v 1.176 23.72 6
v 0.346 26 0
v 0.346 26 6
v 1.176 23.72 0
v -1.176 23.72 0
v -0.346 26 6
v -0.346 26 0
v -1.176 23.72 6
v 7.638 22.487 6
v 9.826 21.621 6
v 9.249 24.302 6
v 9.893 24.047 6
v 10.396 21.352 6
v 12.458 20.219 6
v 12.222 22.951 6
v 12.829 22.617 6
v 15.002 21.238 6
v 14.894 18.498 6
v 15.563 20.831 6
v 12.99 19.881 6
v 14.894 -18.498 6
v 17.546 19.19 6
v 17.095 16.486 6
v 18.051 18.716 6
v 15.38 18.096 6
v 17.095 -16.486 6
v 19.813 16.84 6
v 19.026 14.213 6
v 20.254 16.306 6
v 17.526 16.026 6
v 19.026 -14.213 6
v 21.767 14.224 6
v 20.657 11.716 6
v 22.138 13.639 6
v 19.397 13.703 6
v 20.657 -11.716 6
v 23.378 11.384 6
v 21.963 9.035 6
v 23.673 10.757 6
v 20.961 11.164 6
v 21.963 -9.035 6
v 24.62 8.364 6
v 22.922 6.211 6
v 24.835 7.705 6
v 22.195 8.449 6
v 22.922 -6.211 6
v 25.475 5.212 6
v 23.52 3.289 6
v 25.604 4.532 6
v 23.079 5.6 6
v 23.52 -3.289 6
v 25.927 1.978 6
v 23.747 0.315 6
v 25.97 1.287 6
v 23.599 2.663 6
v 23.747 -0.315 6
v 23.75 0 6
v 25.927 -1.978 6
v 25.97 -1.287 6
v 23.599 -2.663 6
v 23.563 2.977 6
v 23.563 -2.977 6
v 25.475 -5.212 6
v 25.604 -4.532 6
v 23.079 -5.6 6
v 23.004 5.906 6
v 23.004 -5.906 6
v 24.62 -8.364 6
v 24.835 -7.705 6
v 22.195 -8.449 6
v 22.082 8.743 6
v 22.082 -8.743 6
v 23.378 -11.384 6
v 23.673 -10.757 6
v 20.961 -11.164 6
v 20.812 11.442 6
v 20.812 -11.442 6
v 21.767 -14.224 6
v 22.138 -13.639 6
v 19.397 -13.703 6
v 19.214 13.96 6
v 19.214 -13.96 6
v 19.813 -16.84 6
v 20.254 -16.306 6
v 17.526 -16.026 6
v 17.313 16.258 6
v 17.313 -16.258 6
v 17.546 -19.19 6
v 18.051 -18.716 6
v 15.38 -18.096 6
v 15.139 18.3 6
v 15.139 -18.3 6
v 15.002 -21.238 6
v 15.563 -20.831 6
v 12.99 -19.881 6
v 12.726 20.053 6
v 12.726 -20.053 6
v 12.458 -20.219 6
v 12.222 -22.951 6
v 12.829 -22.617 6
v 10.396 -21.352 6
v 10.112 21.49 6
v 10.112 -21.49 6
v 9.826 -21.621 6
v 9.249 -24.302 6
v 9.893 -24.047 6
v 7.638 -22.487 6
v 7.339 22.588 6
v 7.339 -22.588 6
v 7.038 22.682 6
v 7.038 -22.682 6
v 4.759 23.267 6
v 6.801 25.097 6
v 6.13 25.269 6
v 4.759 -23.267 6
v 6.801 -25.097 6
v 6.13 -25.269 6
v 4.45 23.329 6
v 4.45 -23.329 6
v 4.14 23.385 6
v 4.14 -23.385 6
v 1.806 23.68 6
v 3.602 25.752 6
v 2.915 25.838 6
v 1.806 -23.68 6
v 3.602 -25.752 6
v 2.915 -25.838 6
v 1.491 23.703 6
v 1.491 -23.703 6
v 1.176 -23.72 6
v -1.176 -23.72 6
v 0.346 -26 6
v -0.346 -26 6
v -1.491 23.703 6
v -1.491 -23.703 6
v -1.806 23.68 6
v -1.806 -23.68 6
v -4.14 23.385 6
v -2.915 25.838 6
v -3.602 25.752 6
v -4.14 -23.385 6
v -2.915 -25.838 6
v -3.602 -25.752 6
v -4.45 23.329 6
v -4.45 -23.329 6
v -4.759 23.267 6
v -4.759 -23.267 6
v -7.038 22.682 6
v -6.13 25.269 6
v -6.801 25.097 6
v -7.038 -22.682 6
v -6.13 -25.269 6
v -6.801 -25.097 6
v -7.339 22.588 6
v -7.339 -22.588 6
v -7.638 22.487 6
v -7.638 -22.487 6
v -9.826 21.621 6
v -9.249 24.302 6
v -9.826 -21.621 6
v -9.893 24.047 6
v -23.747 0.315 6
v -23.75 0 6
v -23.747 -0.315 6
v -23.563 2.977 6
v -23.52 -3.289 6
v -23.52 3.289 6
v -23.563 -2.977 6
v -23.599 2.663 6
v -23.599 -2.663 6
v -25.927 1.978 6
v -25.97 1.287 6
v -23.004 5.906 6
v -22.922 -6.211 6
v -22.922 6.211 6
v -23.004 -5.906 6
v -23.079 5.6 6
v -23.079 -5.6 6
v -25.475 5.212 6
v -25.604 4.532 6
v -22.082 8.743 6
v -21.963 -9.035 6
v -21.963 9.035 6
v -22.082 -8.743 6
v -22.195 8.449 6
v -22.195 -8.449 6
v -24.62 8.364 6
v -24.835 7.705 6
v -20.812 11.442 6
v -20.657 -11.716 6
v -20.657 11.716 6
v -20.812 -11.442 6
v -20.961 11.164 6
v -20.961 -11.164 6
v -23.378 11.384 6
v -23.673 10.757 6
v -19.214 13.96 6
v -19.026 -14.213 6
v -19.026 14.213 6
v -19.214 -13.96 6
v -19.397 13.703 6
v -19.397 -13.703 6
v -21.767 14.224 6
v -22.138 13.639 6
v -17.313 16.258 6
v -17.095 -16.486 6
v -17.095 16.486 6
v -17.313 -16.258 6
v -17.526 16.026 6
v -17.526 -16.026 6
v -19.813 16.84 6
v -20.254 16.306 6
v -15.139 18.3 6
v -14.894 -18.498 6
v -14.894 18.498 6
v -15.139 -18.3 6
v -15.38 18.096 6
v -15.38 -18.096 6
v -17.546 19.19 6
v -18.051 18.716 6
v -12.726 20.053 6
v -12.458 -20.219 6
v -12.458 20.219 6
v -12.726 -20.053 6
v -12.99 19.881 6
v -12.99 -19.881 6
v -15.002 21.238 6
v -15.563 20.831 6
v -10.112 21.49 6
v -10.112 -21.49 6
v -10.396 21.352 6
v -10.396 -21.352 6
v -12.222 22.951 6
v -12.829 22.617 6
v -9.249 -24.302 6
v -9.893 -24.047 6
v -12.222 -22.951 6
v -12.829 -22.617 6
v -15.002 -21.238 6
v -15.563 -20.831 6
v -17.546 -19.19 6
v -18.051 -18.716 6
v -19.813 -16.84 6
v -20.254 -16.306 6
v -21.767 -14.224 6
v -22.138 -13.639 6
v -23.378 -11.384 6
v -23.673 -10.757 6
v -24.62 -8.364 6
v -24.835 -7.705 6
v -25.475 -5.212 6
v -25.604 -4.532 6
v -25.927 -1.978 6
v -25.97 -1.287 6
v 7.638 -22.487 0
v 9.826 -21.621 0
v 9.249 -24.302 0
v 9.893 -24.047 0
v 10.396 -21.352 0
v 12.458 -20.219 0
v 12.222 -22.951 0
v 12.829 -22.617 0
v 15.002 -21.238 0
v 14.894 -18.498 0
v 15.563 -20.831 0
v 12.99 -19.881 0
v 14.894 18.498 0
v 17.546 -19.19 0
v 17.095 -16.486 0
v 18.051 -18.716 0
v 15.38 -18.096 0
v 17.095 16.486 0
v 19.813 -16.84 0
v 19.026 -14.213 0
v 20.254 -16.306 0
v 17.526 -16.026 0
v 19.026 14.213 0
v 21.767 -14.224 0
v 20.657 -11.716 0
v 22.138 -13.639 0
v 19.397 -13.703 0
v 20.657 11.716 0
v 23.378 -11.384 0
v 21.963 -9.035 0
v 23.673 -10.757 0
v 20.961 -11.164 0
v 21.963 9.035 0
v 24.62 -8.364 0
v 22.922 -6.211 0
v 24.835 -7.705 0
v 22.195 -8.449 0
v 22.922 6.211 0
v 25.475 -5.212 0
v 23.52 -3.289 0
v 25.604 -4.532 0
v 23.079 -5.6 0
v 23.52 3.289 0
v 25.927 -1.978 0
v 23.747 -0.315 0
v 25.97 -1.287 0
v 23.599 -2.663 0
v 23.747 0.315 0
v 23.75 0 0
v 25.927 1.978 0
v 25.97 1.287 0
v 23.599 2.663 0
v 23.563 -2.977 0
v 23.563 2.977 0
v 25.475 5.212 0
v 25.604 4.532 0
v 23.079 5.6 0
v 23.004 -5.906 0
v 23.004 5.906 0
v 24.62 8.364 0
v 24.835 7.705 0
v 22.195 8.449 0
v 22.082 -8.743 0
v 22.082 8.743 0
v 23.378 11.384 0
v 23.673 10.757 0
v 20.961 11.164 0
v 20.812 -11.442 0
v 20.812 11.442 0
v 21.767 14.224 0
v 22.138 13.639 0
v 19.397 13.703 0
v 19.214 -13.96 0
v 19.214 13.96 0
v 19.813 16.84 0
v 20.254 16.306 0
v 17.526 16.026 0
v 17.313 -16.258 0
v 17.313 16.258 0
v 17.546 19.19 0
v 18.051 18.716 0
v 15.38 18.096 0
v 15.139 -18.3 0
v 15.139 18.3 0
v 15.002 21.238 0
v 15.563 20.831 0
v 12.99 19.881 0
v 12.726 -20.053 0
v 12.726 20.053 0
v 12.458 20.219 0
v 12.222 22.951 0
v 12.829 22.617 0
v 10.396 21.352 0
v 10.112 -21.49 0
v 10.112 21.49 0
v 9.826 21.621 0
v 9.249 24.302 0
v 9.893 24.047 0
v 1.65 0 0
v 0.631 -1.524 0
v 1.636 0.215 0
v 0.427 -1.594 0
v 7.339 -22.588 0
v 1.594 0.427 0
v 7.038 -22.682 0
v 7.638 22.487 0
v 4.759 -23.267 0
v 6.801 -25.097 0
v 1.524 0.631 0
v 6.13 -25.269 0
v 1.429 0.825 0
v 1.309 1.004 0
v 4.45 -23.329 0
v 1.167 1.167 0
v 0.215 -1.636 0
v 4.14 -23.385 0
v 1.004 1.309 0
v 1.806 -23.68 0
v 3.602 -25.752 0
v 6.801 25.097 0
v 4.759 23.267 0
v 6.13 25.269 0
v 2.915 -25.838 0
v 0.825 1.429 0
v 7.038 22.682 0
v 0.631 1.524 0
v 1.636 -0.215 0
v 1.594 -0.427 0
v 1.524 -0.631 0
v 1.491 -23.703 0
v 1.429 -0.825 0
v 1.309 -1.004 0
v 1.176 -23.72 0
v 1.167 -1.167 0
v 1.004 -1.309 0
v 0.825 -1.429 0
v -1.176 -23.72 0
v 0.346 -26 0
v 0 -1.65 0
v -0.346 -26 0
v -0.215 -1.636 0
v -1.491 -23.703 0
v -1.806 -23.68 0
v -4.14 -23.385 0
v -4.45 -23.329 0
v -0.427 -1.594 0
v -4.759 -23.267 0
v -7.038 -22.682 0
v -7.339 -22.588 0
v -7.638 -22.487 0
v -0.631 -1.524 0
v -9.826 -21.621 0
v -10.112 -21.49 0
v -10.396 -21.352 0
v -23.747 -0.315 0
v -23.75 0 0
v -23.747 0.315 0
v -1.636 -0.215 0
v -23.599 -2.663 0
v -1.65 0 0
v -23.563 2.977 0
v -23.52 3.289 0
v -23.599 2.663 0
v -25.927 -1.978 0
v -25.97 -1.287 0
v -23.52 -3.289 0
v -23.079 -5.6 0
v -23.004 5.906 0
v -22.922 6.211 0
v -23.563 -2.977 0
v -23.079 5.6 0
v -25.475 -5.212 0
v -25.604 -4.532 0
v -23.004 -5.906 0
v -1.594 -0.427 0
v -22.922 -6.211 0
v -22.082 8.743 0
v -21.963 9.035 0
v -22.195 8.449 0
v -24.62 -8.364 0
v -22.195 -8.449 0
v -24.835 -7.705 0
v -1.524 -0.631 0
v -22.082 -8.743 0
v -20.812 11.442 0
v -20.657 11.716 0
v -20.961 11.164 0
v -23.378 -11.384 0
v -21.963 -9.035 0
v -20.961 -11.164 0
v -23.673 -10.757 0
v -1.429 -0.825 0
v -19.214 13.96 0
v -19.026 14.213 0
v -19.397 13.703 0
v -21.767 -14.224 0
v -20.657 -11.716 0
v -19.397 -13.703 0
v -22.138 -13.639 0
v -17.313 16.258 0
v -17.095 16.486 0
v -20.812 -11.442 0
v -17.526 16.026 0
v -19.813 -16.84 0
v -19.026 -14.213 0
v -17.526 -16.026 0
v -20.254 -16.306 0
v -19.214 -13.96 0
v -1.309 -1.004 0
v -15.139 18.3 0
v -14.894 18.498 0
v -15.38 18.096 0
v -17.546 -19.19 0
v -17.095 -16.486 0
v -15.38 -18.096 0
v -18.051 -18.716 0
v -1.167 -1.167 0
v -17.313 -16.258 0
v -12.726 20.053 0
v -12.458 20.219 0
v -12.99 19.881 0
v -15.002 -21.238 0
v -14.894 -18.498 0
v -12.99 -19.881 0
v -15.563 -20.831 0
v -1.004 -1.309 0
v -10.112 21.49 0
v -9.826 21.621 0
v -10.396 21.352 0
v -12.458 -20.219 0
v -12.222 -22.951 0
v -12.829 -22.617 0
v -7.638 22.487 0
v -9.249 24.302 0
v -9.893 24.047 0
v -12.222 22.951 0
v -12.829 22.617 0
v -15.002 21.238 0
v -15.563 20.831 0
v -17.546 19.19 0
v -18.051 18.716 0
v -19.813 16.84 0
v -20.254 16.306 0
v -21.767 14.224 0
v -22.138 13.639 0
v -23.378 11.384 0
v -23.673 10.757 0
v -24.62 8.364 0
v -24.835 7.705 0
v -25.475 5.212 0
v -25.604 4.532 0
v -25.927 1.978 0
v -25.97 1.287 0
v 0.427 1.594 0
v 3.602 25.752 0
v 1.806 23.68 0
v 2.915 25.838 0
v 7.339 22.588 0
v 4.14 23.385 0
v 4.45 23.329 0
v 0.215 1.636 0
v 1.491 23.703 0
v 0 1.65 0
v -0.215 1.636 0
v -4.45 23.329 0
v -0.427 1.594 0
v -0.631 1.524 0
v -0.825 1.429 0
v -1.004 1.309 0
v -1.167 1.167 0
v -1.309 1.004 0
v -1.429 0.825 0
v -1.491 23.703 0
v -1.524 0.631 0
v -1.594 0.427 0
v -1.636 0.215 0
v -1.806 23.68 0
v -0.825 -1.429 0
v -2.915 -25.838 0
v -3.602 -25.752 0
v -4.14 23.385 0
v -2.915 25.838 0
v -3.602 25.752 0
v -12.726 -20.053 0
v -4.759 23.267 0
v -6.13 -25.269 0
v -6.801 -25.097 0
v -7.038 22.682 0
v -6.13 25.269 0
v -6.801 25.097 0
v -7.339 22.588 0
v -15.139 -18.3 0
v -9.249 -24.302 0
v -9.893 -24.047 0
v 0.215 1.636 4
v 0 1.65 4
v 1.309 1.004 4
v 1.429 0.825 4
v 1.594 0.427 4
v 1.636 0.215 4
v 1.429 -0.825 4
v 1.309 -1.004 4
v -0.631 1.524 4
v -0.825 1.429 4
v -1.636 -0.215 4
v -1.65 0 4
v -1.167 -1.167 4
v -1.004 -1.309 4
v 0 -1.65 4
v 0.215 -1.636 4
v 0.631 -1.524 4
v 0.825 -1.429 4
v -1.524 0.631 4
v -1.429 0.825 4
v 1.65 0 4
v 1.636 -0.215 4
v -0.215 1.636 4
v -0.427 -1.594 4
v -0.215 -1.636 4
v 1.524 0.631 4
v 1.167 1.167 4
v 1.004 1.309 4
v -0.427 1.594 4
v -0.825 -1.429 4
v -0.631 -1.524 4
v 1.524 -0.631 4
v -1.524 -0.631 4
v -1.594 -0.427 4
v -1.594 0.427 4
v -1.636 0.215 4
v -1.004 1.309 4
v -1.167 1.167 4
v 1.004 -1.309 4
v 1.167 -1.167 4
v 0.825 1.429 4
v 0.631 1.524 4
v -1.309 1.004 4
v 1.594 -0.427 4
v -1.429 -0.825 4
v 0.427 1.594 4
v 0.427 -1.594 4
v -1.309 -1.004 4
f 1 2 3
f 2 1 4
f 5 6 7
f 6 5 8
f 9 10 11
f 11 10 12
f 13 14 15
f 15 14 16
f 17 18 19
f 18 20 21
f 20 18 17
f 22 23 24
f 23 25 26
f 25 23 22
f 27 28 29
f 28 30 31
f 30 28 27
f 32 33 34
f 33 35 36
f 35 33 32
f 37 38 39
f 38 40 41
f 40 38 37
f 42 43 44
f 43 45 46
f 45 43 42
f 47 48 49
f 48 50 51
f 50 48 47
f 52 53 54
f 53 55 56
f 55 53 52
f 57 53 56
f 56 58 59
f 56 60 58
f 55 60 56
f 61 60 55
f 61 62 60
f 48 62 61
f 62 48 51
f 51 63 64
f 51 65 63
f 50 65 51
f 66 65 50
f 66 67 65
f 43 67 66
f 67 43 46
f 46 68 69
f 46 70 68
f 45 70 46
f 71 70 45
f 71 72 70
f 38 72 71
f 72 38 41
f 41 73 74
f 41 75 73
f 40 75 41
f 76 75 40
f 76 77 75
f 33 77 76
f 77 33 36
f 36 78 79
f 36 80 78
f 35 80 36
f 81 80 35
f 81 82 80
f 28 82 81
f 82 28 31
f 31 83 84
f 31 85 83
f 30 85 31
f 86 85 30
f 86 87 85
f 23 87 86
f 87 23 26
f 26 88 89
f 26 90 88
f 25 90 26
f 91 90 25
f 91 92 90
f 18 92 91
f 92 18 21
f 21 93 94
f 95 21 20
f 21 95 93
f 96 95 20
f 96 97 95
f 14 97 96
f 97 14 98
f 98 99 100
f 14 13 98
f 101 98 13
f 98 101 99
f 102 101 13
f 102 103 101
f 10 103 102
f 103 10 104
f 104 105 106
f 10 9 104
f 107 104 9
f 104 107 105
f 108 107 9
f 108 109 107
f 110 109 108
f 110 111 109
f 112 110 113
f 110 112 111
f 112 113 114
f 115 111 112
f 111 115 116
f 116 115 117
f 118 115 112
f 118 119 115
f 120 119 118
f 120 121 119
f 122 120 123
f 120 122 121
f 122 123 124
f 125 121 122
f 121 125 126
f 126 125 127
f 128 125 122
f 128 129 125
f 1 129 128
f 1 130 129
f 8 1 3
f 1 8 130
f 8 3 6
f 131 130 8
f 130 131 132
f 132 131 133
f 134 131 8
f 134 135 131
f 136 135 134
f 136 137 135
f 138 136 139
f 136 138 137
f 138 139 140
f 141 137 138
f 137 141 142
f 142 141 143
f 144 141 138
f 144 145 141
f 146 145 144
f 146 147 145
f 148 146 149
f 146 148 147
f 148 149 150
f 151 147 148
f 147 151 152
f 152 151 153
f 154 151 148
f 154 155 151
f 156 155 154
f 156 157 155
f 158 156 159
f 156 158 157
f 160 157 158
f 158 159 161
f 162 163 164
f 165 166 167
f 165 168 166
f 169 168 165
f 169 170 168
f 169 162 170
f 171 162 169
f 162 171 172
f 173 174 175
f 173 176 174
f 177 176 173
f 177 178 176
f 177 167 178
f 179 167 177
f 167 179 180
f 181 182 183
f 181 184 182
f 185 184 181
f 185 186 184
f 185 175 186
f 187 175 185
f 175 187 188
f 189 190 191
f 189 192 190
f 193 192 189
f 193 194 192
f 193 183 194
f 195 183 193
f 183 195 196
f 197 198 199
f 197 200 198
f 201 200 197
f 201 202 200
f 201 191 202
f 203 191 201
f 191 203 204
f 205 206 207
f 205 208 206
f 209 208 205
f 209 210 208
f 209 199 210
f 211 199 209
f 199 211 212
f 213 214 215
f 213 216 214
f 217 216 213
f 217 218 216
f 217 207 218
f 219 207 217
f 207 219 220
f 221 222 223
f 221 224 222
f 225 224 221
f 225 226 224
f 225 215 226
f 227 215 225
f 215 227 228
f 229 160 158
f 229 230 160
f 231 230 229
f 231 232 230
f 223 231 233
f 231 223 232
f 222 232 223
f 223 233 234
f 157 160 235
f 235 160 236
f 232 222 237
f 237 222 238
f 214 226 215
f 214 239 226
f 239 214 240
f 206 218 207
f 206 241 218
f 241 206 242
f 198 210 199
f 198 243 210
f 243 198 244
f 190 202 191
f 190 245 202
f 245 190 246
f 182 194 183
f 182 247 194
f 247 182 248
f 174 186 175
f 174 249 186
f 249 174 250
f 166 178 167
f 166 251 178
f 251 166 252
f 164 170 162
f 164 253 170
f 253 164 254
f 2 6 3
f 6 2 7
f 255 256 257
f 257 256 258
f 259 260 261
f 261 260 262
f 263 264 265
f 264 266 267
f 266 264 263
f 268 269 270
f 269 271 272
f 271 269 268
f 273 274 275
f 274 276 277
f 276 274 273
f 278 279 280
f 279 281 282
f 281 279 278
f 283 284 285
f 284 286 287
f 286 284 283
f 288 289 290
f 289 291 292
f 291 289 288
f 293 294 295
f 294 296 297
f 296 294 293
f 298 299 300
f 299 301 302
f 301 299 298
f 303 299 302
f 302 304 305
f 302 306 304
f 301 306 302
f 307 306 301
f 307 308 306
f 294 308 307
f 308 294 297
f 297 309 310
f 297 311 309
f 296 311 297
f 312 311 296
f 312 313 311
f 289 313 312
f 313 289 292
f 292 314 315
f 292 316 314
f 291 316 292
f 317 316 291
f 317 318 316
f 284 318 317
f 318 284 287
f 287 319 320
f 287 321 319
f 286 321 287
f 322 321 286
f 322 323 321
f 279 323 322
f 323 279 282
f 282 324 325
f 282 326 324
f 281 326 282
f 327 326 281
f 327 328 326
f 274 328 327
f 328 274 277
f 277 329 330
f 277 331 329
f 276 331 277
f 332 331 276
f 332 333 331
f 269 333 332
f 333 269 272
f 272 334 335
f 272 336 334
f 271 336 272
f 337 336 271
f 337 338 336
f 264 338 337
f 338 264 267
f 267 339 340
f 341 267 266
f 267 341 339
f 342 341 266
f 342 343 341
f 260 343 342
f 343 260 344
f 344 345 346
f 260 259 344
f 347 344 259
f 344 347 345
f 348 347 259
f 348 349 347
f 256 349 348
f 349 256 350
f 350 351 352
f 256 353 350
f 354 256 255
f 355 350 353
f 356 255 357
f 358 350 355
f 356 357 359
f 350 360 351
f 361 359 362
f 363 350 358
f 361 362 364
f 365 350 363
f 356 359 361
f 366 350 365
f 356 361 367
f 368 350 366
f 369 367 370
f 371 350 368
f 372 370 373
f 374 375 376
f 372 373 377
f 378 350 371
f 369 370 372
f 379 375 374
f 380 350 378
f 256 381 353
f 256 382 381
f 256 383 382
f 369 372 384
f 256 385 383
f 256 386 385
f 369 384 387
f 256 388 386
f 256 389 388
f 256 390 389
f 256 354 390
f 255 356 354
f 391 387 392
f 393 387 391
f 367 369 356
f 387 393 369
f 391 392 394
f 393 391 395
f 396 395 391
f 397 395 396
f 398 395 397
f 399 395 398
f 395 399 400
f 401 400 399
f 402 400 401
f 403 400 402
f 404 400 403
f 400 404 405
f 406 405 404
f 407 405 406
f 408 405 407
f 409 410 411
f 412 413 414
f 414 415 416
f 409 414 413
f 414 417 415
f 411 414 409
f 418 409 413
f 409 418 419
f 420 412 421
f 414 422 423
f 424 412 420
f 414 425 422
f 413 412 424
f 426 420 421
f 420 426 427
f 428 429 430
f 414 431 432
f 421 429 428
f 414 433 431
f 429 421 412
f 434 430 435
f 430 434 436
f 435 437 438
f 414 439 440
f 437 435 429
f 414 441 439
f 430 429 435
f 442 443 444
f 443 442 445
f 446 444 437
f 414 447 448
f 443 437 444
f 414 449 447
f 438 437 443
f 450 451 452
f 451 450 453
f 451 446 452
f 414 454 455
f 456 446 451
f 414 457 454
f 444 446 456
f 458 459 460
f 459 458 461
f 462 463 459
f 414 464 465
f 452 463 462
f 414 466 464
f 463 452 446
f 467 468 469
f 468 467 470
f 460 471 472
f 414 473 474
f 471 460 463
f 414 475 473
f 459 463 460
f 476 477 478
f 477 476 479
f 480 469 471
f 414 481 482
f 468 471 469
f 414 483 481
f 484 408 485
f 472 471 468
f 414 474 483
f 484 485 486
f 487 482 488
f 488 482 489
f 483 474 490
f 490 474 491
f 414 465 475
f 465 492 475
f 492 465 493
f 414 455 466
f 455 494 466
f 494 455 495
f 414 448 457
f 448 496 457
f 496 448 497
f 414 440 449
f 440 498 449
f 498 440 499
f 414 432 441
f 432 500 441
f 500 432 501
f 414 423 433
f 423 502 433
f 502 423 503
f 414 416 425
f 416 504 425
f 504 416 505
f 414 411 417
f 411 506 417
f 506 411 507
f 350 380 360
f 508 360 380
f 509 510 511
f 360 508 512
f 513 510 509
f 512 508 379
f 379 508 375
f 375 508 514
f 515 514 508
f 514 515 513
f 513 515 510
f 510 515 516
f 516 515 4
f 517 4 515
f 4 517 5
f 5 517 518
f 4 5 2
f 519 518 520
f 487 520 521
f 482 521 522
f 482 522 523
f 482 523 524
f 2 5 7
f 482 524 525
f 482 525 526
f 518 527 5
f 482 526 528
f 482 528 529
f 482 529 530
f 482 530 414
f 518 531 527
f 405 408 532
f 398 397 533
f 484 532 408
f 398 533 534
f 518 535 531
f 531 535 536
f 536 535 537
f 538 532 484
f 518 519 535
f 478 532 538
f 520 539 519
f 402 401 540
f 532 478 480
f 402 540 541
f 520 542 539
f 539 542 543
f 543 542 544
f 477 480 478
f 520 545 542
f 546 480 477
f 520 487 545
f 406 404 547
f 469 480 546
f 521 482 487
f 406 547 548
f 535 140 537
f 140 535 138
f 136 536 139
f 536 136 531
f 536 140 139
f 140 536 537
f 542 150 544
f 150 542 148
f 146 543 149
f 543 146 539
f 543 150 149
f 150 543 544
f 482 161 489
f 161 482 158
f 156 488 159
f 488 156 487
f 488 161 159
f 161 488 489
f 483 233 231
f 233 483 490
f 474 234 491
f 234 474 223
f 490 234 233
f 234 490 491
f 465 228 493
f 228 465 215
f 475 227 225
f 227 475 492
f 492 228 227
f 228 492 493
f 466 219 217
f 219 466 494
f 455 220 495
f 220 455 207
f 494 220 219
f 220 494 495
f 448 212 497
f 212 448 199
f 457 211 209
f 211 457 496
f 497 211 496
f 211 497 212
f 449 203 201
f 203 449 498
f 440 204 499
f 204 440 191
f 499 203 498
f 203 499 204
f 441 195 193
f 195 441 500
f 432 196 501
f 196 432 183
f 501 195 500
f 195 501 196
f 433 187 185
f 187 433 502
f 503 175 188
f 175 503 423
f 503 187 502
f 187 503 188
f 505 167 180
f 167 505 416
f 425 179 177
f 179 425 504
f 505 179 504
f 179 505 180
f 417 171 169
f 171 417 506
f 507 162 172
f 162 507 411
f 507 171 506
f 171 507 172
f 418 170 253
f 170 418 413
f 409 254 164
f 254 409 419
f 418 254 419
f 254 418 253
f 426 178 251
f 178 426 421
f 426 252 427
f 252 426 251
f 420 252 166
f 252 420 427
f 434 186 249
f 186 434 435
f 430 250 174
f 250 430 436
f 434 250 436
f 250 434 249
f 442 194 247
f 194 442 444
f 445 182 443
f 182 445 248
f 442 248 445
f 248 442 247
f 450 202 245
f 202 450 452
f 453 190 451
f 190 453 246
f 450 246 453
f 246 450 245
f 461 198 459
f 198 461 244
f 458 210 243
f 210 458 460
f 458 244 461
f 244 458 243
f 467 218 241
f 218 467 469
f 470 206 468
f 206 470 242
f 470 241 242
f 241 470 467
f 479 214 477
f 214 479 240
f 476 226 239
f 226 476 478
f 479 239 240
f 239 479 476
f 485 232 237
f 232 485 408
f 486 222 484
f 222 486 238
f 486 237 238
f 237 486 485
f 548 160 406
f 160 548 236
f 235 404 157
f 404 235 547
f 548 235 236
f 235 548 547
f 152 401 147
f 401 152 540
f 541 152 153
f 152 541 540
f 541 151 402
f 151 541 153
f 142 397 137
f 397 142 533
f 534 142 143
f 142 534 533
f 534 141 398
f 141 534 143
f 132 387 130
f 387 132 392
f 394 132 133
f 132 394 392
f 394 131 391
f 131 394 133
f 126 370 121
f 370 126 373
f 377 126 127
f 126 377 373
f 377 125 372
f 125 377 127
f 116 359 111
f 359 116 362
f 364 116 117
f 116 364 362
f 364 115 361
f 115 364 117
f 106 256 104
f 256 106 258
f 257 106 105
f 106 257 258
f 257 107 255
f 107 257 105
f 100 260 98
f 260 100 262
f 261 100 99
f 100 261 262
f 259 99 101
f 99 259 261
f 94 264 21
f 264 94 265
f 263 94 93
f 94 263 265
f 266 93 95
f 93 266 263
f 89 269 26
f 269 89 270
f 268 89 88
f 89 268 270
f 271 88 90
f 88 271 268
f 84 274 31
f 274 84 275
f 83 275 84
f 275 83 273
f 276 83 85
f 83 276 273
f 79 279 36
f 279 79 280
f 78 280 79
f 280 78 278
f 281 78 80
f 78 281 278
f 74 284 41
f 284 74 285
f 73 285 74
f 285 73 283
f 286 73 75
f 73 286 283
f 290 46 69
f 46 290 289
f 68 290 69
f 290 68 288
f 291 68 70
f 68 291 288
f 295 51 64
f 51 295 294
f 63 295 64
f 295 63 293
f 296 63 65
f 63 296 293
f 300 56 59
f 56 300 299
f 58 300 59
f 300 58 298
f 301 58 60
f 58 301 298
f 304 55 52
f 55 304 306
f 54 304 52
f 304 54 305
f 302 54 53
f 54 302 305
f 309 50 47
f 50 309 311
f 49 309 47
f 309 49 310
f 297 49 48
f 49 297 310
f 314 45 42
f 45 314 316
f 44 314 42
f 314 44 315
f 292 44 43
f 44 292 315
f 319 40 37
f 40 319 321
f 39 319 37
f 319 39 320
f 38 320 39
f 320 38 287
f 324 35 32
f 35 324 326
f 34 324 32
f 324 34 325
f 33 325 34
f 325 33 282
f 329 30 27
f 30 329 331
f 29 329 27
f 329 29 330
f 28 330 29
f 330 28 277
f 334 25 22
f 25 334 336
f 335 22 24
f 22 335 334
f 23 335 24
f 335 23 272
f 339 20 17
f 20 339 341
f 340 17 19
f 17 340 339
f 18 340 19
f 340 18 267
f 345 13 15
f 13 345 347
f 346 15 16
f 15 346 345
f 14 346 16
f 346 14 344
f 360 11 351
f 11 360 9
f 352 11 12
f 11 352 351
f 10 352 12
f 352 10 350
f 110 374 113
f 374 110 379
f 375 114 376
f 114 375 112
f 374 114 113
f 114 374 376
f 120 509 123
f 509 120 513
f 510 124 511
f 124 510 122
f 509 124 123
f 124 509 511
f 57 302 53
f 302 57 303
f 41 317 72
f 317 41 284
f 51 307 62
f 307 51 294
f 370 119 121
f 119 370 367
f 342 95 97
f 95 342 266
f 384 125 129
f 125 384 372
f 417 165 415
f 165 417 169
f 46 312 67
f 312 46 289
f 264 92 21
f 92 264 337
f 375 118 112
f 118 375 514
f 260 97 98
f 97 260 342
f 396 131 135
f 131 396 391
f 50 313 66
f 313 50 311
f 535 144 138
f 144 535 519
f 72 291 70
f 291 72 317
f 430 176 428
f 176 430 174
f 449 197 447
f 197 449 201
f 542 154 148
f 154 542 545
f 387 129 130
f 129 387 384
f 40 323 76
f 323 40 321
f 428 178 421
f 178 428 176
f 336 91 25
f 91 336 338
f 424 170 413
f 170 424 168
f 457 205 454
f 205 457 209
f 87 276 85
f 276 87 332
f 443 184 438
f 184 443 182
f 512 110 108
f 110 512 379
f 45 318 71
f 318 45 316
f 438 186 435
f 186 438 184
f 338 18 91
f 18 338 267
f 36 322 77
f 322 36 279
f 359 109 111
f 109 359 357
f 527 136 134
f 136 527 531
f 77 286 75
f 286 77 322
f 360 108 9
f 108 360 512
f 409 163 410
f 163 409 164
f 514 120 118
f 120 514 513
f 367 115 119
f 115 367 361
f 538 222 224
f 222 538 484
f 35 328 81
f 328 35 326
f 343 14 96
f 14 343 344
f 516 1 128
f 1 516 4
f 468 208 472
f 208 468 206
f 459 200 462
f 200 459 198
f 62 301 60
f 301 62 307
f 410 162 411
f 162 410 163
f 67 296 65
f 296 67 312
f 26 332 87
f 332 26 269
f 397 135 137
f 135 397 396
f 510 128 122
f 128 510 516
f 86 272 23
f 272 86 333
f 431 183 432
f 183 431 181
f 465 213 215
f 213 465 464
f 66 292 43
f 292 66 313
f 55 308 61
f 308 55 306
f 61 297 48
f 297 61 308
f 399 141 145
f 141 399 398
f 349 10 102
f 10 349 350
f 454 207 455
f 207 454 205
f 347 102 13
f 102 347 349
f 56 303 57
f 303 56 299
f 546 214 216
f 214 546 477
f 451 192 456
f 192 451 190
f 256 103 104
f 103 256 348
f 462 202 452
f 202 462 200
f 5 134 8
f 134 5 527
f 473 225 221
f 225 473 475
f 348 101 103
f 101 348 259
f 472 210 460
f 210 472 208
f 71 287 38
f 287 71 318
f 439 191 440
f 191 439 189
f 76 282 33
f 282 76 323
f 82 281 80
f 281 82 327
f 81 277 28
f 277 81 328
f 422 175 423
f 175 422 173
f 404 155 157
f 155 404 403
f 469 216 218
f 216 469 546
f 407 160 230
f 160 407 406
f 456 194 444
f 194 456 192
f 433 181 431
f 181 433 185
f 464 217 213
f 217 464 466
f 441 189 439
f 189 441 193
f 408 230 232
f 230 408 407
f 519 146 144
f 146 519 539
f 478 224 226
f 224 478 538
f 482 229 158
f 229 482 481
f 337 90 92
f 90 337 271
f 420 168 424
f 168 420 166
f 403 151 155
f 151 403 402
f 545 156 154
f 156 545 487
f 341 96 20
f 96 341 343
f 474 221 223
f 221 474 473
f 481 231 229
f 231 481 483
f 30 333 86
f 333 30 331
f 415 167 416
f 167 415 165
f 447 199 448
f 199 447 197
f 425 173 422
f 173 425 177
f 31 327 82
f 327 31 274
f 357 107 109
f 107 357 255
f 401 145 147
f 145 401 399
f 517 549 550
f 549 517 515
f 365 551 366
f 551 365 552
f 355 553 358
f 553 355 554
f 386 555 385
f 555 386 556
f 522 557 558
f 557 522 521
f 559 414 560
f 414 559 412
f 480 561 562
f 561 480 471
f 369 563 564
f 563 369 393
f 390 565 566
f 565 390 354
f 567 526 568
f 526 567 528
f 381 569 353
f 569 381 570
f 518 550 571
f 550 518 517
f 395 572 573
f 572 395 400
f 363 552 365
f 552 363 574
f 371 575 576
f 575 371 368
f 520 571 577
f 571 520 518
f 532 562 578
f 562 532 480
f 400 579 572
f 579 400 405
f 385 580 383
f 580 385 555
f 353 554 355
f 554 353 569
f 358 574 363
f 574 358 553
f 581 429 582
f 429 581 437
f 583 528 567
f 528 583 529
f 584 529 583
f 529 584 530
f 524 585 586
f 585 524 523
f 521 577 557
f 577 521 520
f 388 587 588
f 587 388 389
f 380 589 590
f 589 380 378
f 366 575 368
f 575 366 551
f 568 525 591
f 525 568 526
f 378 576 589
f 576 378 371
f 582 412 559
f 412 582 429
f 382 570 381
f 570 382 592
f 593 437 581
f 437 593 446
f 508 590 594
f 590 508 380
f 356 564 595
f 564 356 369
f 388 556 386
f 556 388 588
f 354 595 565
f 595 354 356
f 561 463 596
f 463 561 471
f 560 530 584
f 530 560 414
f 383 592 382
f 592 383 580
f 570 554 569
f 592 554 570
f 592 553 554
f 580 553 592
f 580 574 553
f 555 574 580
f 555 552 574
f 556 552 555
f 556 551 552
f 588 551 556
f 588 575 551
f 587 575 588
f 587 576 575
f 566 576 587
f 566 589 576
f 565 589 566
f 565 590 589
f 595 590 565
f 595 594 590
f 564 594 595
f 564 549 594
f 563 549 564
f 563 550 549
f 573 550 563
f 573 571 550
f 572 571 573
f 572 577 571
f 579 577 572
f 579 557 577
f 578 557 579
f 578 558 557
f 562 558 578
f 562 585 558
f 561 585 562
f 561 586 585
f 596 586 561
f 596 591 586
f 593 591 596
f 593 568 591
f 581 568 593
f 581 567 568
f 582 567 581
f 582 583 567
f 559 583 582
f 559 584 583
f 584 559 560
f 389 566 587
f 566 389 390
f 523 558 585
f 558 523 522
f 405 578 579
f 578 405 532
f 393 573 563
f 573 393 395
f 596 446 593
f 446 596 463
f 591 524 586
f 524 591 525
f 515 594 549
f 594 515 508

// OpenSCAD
// file: gearlib.scad
// =====================================================================
//  齿轮生成器（梯形齿廓，3D 布尔并集）
//
//  为什么不用渐开线 + 2D 并集：
//    渐开线齿廓拼成单一闭合多边形时，齿根圆弧与相邻齿面在端点处重合，
//    OpenSCAD 的 2D 三角化会产生自交/退化面，挤出后网格不封闭。
//
//  这里改为：根圆柱 + 逐个梯形齿块，齿块底部径向内嵌到 rf−0.6，
//  形成**体积重叠**而非面接触，布尔并集稳定，导出必为封闭流形。
//
//  齿廓用直线代替渐开线：对 3D 打印的玩具齿轮（低速、轻载）精度足够，
//  且齿侧留 0.15mm 齿隙，装配不咬死。
// =====================================================================

module tooth_prism(z = 20, m = 1, t = 6, clearance = 0.15) {
    p  = PI * m;                      // 周节
    rp = m * z / 2;
    ra = rp + m;
    rf = max(1.2, rp - 1.25 * m);
    rb = rf - 0.6;                    // 底部内嵌半径（保证与根圆重叠）

    hw_p = p / 4 - clearance / 2;     // 分度圆处半齿宽
    k    = tan(20);                   // 压力角正切

    hw_b = hw_p + (rp - rb) * k;      // 底部半宽
    hw_a = max(0.12, hw_p - (ra - rp) * k);   // 顶部半宽

    linear_extrude(height = t, convexity = 4)
        polygon([[-hw_b, rb], [hw_b, rb], [hw_a, ra], [-hw_a, ra]]);
}

module gear(z = 20, m = 1, t = 6, bore = 0, clearance = 0.15) {
    rp = m * z / 2;
    rf = max(1.2, rp - 1.25 * m);

    difference() {
        union() {
            cylinder(r = rf, h = t, $fn = max(48, z * 6));
            for (k = [0 : z - 1])
                rotate([0, 0, k * 360 / z])
                    translate([0, 0, 0])
                        tooth_prism(z = z, m = m, t = t, clearance = clearance);
        }
        if (bore > 0)
            cylinder(d = bore, h = t + 2, center = true, $fn = 48);
    }
}

/* 齿条齿块（供滑块使用） */
module rack_teeth(len, m = 1, t = 2.25, pa = 20) {
    p   = PI * m;
    n   = floor(len / p);
    hw1 = p / 4 + m * tan(pa);
    hw2 = p / 4 - m * tan(pa);
    for (i = [0 : n - 1])
        translate([i * p, 0, 0])
            linear_extrude(height = t, convexity = 4)
                polygon([[-hw1, -0.6], [hw1, -0.6], [hw2, t], [-hw2, t]]);
}
// file: params.scad
// =====================================================================
//  皮筋储能自动循环发射器 —— 全局参数
//  mechanical/elastic-launcher/
//
//  坐标系：
//    X = 发射方向（0 = 尾端，base_x = 前端枪口）
//    Y = 横向（0 = 弹道中心线）
//    Z = 垂直（0 = 桌面，底板占 0..base_t）
//
//  机构链：
//    电机 → 两级齿轮 1:25 → 曲柄盘 → C 形拨叉拖滑块后移（皮筋张紧）
//    → 曲柄销脱出拨叉 → 皮筋释放 → 击针前冲击发 → 曲柄销重新咬合
//
//  一次循环 = 曲柄盘转一圈 = 一发
// =====================================================================

$fn = 96;

/* ================= 底板 ================= */
base_x    = 120;
base_y    = 65;
base_t    = 6;
corner_r  = 3;

/* ================= 弹道 ================= */
bore      = 13;     // 通道内宽
barrel_x0 = 74;     // 筒起点
barrel_x1 = 120;    // 枪口
wall      = 2.4;    // 壁厚
barrel_h  = 22;     // 侧壁高（底板顶面起）

/* ================= 弹丸 ================= */
ball_d    = 11;
feed_x    = 82;     // 弹仓落弹点 X（须在击针静止位之前）
mag_h     = 40;     // 弹仓高出筒顶

/* ================= 皮筋储能 ================= */
band_n    = 3;      // 皮筋根数（并联）
band_k    = 80;     // 单根刚度 N/m
stroke    = 22;     // 击发行程 = 皮筋拉伸量（受底板长度限制）
pinion_x  = 28;     // 齿条驱动小齿轮中心 X
anchor_x  = 108;    // 皮筋前锚点 X

/* ================= 击发滑块 ================= */
sled_w    = 14;     // 滑块宽
sled_body_l = 30;   // 滑块本体长
rod_l     = 22;     // 击针长
rod_d     = 4;      // 击针直径

/* ================= 齿轮（两级 1:25） ================= */
gear_m    = 1.0;    // 模数
gear_pa   = 20;     // 压力角（度）
z_small   = 10;
z_big     = 50;
gear_t    = 6;      // 齿轮厚
shaft_d   = 3.0;    // 轴径（打印轴或钢轴）

// 中心距 = (z1+z2)*m/2 = 30
center_d  = (z_small + z_big) * gear_m / 2;

// 电机
motor_d   = 24.4;   // 130 型外壳直径
motor_l   = 38;
motor_x   = 88;     // 与输出小齿轮同轴
motor_z   = 22;      // 与齿轮轴同高

// 齿轮层（Y 方向错开，避免 50 齿互相干涉）
layer1_y  = 15;
layer2_y  = 23;

/* ================= 紧固件 ================= */
screw_d   = 2.4;
m3_d      = 3.4;
// file: parts.scad
// =====================================================================
//  皮筋储能自动循环发射器 —— 零件模块库
//  include <params.scad> 后调用；本文件自身不产生几何体
// =====================================================================

include <params.scad>
include <gearlib.scad>

/* ---------------------------------------------------------------
   通用：圆角矩形板
   --------------------------------------------------------------- */
module rrect(x0, y0, x1, y1, z0, z1, r) {
    hull()
        for (x = [x0 + r, x1 - r])
            for (y = [y0 + r, y1 - r])
                translate([x, y, z0]) cylinder(r = r, h = z1 - z0);
}

/* ---------------------------------------------------------------
   齿条齿形（梯形近似，模数 m）
   --------------------------------------------------------------- */
module rack_teeth(len, m = 1, t = 2.25, pa = 20) {
    p   = PI * m;
    n   = floor(len / p);
    hw1 = p / 4 + m * tan(pa);   // 齿根半宽
    hw2 = p / 4 - m * tan(pa);   // 齿顶半宽
    for (i = [0 : n - 1])
        translate([i * p, 0, 0])
            linear_extrude(height = t, convexity = 4)
                polygon([[-hw1, 0], [-hw2, t], [hw2, t], [hw1, 0]]);
}

/* ===============================================================
   1. 底板 base-plate
   =============================================================== */
module base_plate() {
    difference() {
        rrect(0, -base_y / 2, base_x, base_y / 2, 0, base_t, corner_r);

        // 滑块导轨槽（两条，限制滑块只能沿 X 滑动）
        for (s = [-1, 1])
            translate([8, s * sled_w / 2, base_t - 2])
                cube([70, 1.6, 4]);

        // 齿轮箱固定孔
        for (x = [28, 58, 88])
            translate([x, 34, -1]) cylinder(d = screw_d, h = base_t + 2);

        // 皮筋锚架固定孔
        for (s = [-1, 1])
            translate([112, s * 20, -1]) cylinder(d = screw_d, h = base_t + 2);

        // 弹道筒固定孔
        for (x = [70, 122])
            for (s = [-1, 1])
                translate([x, s * (bore / 2 + wall / 2), -1])
                    cylinder(d = screw_d, h = base_t + 2);

        // 按钮座孔
        translate([100, -26, -1]) cylinder(d = screw_d, h = base_t + 2);

        // 减重槽
        for (x = [16, 44])
            translate([x, -18, 1.5]) hull() {
                translate([-5, -5, 0]) cylinder(r = 2.5, h = base_t);
                translate([5, -5, 0]) cylinder(r = 2.5, h = base_t);
                translate([-5, 5, 0]) cylinder(r = 2.5, h = base_t);
                translate([5, 5, 0]) cylinder(r = 2.5, h = base_t);
            }
    }
}

/* ===============================================================
   2. 击发滑块 striker（齿条 + 击针 + 皮筋挂钩）
   =============================================================== */
module striker() {
    // 本体
    translate([0, -sled_w / 2, base_t])
        cube([sled_body_l, sled_w, 11]);
    // 齿条：位于本体顶面，长度 = 行程
    translate([4, -sled_w / 2, base_t + 11])
        cube([stroke, sled_w, 1.2]);
    translate([4, -sled_w / 2, base_t + 11])
        rack_teeth(stroke, gear_m, 2.25);
    // 击针
    translate([sled_body_l, 0, base_t + 5])
        rotate([0, 90, 0])
            cylinder(d = rod_d, h = rod_l);
    // 皮筋挂钩（后端）
    translate([-2, 0, base_t + 3])
        rotate([0, 90, 0])
            cylinder(d = 5, h = 4);
}

/* ===============================================================
   3. 弹道筒 barrel（含侧向落弹孔）
   =============================================================== */
module barrel() {
    z0 = base_t;
    difference() {
        // 外形
        translate([barrel_x0, -bore / 2 - wall, z0])
            cube([barrel_x1 - barrel_x0, bore + 2 * wall, barrel_h]);
        // 内腔
        translate([barrel_x0 - 1, -bore / 2, z0 - 1])
            cube([barrel_x1 - barrel_x0 + 2, bore, barrel_h + 1]);
        // 落弹孔（顶部，Ø = 弹丸 + 间隙）
        translate([feed_x, 0, z0 + barrel_h - 1])
            cylinder(d = ball_d + 0.6, h = 4);
        // 弹仓内腔
        translate([feed_x, 0, z0 + barrel_h])
            cylinder(d = ball_d + 0.6, h = mag_h + 1);
    }
    // 弹仓外壁
    difference() {
        translate([feed_x, 0, z0 + barrel_h])
            cylinder(d = ball_d + 0.6 + 2 * wall, h = mag_h);
        translate([feed_x, 0, z0 + barrel_h - 1])
            cylinder(d = ball_d + 0.6, h = mag_h + 2);
    }
}

/* ===============================================================
   4. 齿轮箱 gearbox（电机夹 + 三根轴支撑）
   =============================================================== */
module gearbox() {
    yp = 29;            // 立板起始 Y（在齿轮层之外，避免干涉）
    pt = 5;             // 立板厚

    // 立板 + 三处轴座
    difference() {
        union() {
            translate([8, yp, base_t])
                cube([92, pt, 46]);
            // 轴座凸台
            for (x = [28, 58, 88])
                translate([x, yp - 4, 22])
                    rotate([-90, 0, 0])
                        cylinder(d = 12, h = pt + 4);
            // 电机夹持筒
            translate([88, yp, 22])
                rotate([-90, 0, 0])
                    cylinder(d = motor_d + 6, h = 20);
        }
        // 三个轴承孔
        for (x = [28, 58, 88])
            translate([x, yp - 5, 22])
                rotate([-90, 0, 0])
                    cylinder(d = shaft_d + 0.4, h = pt + 8);
        // 电机腔
        translate([88, yp - 1, 22])
            rotate([-90, 0, 0])
                cylinder(d = motor_d + 0.4, h = 19);
        // 减重
        for (x = [40, 70])
            translate([x, yp - 1, base_t + 10])
                cube([14, pt + 2, 20]);
        // 底板固定孔
        for (x = [28, 58, 88])
            translate([x, yp + 2, base_t - 1])
                cylinder(d = screw_d, h = 8);
    }
}

/* ===============================================================
   5. 皮筋前锚架 band-frame（含击针导套）
   =============================================================== */
module band_frame() {
    difference() {
        union() {
            // 立架（两侧翼，皮筋从 y=±13 走线，避开弹道筒）
            translate([108, -26, base_t])
                cube([6, 52, 26]);
            // 击针导套
            translate([barrel_x0 - 12, 0, base_t + 5])
                rotate([0, 90, 0])
                    cylinder(d = rod_d + 2, h = 12);
        }
        // 皮筋挂槽（y=±13）
        for (s = [-1, 1])
            translate([107, s * 13 - 2, base_t + 16])
                cube([8, 4, 8]);
        // 导套内孔
        translate([barrel_x0 - 13, 0, base_t + 5])
            rotate([0, 90, 0])
                cylinder(d = rod_d + 0.4, h = 14);
        // 底板固定
        for (s = [-1, 1])
            translate([111, s * 20, base_t - 1])
                cylinder(d = screw_d, h = 8);
    }
}

/* ===============================================================
   6. 按钮座 button-mount
   =============================================================== */
module button_mount() {
    difference() {
        union() {
            translate([90, -32, base_t]) cube([20, 14, 4]);
            translate([90, -22, base_t]) cube([20, 4, 16]);
        }
        translate([100, -20, base_t + 9])
            rotate([-90, 0, 0]) cylinder(d = 12.2, h = 6);
        translate([100, -26, base_t - 1]) cylinder(d = screw_d, h = 6);
    }
}
// main file
include <parts.scad>

gear(z = z_big, m = gear_m, t = gear_t, bore = shaft_d + 0.3);
